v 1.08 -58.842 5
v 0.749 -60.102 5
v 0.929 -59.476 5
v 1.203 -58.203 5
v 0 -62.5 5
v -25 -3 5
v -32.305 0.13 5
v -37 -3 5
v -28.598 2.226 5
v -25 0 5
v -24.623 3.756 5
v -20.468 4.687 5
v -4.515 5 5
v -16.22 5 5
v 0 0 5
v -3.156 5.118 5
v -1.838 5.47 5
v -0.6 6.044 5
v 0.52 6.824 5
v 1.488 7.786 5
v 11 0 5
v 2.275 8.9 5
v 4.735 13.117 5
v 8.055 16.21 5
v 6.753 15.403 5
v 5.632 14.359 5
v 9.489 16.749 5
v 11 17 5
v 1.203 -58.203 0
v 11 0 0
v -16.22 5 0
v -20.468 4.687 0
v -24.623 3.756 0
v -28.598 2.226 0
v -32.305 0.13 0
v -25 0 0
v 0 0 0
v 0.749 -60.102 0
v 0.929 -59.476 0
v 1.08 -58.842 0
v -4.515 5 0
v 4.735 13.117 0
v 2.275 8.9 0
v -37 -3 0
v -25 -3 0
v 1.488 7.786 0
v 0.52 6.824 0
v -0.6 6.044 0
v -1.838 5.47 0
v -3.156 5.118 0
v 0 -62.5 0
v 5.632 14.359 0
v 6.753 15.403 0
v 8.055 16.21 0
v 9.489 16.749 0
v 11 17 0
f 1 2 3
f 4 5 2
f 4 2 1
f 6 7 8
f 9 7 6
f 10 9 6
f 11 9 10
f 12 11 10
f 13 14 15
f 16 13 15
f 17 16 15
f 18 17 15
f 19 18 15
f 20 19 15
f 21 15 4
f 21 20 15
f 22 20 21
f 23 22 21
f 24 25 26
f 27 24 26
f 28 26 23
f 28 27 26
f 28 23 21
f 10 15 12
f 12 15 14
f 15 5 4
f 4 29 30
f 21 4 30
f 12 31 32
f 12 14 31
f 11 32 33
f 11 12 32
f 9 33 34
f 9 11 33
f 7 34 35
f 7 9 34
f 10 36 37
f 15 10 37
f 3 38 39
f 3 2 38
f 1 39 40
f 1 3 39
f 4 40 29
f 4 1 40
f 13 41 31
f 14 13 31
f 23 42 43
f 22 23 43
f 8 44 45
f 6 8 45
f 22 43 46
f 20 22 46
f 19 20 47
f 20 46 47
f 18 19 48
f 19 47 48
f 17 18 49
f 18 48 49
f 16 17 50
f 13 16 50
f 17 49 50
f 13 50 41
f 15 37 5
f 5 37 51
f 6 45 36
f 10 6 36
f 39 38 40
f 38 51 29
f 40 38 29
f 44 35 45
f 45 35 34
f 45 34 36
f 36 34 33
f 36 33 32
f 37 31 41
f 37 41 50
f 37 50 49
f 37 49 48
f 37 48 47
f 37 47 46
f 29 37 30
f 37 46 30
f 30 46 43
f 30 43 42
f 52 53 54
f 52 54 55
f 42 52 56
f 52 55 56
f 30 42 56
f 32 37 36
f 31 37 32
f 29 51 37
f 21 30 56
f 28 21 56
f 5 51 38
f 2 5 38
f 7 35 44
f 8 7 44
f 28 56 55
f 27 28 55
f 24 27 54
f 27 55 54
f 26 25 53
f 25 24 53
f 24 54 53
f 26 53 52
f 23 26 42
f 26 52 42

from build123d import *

# Parameters (mm, degrees)
F1_DEPTH    = 5
F2_T1_DEPTH = 5
F2_T3_DEPTH = 27.4743818089
F3_R        = 28.9973991458
F4_R        = 14.3918110757


# Not quite as in the source:
# - a fillet or chamfer that OpenCascade refuses, or shapes differently, is made with other operations: its cross-section is extruded or revolved along the edge and cut away or added


with BuildPart() as f1:
    # F0 (on Top) → F1 (new body)
    with BuildSketch(Plane.XY):
        Polygon((-25, 0), (0, 0), (0, -62.5), (1.0401320628, -59.1675673885), (11, 0), (11, 17), (7, 17), (0, 5), (-25, 5), (-37, -3), (-25, -3), align=None)
    extrude(amount=F1_DEPTH)

    # F2: fillet of radius 7.861186634 on 2 edges, made by hand

    # F2_s2 → F2_t1 (join)
    with BuildSketch(Plane.XY):
        with BuildLine():
            ThreePointArc((2.27509477, 8.9001624629), (-0.5998840547, 6.0444203344), (-4.5152323805, 5))
            Line((-4.5152323805, 5), (0, 5))
            Line((0, 5), (2.27509477, 8.9001624629))
        make_face()
    extrude(amount=F2_T1_DEPTH)

    # F2_s4 → F2_t3 (cut)
    with BuildSketch(Plane.XY.offset(-11.2371909045)):
        with BuildLine():
            ThreePointArc((11, 17), (7.3843664174, 15.838413937), (4.735162038, 13.1174206365))
            Line((4.735162038, 13.1174206365), (7, 17))
            Line((7, 17), (11, 17))
        make_face()
    extrude(amount=F2_T3_DEPTH, mode=Mode.SUBTRACT)

    # F3
    f3_edges = [f1.edges().sort_by_distance(p)[0] for p in [
        (-25, 5, 2.5),
    ]]
    fillet(f3_edges, radius=F3_R)

    # F4
    f4_edges = [f1.edges().sort_by_distance(p)[0] for p in [
        (1.040132, -59.167567, 2.5),
    ]]
    fillet(f4_edges, radius=F4_R)


solid = f1.part
